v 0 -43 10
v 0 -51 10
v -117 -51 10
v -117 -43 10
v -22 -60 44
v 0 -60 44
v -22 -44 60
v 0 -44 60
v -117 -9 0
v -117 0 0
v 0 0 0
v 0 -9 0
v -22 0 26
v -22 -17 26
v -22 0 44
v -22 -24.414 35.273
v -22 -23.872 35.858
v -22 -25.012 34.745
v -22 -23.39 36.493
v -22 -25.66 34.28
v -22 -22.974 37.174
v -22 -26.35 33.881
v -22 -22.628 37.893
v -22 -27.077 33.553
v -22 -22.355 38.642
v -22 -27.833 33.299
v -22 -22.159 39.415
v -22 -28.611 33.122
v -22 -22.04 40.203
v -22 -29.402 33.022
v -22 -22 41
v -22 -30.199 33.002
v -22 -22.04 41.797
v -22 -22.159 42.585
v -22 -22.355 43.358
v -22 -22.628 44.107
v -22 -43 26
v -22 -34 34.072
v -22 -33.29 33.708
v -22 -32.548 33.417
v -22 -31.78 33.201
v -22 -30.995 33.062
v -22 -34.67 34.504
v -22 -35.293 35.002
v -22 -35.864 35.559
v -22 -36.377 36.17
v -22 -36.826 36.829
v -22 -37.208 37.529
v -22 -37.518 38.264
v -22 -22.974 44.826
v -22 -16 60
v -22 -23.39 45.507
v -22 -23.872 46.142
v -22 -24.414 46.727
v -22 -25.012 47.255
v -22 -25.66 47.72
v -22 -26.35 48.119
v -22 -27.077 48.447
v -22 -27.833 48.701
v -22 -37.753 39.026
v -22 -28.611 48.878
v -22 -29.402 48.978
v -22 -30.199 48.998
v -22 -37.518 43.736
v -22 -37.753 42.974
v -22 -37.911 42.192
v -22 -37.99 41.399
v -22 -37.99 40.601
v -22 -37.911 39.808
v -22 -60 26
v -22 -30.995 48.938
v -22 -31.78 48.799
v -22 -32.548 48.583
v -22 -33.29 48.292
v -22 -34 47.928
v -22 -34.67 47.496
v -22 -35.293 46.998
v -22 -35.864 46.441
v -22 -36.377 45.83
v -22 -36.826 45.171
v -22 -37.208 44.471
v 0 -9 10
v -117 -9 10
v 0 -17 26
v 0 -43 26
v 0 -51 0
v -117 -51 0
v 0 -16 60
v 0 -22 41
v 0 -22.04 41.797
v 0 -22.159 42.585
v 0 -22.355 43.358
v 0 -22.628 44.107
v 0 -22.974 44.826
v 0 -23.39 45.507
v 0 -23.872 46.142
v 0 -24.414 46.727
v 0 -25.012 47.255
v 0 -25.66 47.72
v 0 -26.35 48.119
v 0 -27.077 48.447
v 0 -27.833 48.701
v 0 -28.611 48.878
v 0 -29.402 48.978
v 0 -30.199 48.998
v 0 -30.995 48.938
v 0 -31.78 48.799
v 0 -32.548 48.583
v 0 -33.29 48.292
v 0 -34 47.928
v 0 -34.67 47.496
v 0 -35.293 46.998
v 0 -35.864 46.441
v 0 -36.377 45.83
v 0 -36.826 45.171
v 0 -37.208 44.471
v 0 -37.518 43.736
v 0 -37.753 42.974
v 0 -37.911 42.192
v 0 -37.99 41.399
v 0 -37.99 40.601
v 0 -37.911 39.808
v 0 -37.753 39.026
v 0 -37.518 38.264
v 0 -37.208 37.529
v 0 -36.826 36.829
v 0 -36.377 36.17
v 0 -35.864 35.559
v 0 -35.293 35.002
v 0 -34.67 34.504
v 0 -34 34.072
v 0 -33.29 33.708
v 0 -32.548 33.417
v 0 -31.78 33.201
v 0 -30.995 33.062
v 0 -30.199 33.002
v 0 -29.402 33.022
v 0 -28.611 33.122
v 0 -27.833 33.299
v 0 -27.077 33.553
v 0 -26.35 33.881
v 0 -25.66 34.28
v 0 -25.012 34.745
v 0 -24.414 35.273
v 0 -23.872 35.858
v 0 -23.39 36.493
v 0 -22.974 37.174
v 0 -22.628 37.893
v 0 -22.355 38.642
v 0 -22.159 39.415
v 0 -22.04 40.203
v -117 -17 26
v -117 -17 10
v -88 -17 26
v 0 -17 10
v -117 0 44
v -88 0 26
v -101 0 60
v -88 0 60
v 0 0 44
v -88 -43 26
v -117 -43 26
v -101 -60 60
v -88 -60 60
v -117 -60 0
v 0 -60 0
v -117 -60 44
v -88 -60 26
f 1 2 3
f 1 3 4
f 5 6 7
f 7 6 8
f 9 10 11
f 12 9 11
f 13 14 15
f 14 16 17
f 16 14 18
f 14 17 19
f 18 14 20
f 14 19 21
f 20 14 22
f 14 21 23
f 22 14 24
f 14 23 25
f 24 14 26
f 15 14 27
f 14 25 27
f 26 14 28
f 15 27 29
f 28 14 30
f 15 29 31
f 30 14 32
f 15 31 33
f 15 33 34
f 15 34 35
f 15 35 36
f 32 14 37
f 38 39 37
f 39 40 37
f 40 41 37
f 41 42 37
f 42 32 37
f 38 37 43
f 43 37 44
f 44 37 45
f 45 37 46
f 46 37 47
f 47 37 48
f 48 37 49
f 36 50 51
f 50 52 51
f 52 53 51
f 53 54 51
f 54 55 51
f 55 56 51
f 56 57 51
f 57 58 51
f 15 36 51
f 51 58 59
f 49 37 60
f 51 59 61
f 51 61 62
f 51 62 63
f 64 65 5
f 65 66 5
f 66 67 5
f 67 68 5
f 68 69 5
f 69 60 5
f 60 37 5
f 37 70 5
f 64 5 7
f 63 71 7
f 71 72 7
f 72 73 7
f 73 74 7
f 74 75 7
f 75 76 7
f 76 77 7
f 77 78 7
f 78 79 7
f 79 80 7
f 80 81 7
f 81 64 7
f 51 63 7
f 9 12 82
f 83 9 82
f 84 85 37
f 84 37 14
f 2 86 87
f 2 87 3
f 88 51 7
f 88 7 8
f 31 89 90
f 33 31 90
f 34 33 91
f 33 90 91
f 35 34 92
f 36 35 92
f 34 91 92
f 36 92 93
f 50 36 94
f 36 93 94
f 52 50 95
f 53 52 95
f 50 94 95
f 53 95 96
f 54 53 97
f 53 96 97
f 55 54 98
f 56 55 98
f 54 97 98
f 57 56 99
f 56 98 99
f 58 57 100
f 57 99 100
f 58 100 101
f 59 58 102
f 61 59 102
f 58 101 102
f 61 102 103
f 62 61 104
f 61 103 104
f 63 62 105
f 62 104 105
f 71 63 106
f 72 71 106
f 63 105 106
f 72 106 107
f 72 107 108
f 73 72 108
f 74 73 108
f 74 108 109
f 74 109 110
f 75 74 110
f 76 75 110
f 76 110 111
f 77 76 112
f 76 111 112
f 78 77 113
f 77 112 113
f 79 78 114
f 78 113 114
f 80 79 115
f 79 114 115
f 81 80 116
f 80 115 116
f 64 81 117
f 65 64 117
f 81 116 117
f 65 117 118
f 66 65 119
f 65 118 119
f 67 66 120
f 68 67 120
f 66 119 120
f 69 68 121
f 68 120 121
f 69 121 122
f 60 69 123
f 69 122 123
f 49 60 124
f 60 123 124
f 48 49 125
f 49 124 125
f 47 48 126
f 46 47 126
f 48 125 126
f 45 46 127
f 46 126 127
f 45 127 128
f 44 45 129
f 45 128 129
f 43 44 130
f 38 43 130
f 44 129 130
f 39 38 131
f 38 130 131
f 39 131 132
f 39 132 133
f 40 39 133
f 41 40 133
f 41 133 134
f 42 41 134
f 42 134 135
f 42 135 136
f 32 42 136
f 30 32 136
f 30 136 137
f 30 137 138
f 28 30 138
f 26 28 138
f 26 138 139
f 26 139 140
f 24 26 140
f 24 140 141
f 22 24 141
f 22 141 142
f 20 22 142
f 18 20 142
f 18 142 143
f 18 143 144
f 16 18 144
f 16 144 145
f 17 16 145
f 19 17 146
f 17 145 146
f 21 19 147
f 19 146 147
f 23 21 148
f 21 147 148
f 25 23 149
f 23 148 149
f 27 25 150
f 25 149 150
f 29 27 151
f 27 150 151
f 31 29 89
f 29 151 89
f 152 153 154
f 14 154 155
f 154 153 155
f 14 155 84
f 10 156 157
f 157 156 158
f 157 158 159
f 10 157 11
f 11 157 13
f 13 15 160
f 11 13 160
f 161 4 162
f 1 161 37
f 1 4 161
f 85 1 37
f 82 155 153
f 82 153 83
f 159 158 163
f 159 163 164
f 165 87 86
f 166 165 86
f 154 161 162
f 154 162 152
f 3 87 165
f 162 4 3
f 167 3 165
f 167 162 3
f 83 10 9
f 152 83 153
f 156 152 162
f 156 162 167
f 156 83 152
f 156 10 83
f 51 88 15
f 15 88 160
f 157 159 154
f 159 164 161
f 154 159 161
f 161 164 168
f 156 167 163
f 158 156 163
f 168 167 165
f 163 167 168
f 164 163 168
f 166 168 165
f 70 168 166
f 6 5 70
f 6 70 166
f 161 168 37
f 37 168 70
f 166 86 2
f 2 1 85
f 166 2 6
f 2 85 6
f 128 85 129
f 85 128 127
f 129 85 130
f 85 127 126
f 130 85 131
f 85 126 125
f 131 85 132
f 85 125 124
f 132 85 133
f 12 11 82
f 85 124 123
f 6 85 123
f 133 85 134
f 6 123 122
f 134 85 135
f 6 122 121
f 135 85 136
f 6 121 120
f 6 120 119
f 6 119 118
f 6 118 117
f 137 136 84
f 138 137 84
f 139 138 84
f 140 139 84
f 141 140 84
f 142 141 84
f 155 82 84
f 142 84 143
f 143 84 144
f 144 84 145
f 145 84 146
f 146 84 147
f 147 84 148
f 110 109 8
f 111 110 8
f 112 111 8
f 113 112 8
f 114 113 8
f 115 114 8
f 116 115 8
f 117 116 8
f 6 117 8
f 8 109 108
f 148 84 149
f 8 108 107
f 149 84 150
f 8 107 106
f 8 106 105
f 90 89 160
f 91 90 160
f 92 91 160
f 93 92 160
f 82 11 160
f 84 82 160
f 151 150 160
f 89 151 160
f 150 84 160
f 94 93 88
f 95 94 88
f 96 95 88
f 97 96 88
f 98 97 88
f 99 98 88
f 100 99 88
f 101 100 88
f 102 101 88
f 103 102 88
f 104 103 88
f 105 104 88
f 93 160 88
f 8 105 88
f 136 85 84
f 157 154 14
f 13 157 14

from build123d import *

# Parameters (mm, degrees)
F0_W      = 117
F0_H      = 60
F1_DEPTH  = 60
F2_W      = 42
F2_H      = 10
F3_DEPTH  = 117
F4_W      = 26
F4_H      = 16
F5_DEPTH  = 117
F7_DEPTH  = 22
F9_DEPTH  = 22
F11_DEPTH = 22
F13_DEPTH = 60
F15_DEPTH = 60


with BuildPart() as f1:
    # F0 (on Front) → F1 (new body)
    with BuildSketch(Plane.XZ):
        with Locations((-58.5, 30)):
            Rectangle(F0_W, F0_H)
    extrude(amount=F1_DEPTH)

    # F2 (on face) → F3 (cut)
    with BuildSketch(Plane.YZ):
        with Locations((-30, 5)):
            Rectangle(F2_W, F2_H)
    extrude(amount=-F3_DEPTH, mode=Mode.SUBTRACT)

    # F4 (on face) → F5 (cut)
    with BuildSketch(Plane.YZ):
        with Locations((-30, 18)):
            Rectangle(F4_W, F4_H)
    extrude(amount=-F5_DEPTH, mode=Mode.SUBTRACT)

    # F6 (on face) → F7 (cut)
    with BuildSketch(Plane.YZ):
        with BuildLine():
            ThreePointArc((-38, 41), (-30, 33), (-22, 41))
            ThreePointArc((-22, 41), (-30, 49), (-38, 41))
        make_face()
    extrude(amount=-F7_DEPTH, mode=Mode.SUBTRACT)

    # F8 (on face) → F9 (cut)
    with BuildSketch(Plane.YZ):
        Polygon((-44, 60), (-60, 60), (-60, 44), align=None)
    extrude(amount=-F9_DEPTH, mode=Mode.SUBTRACT)

    # F10 (on face) → F11 (cut)
    with BuildSketch(Plane.YZ):
        Polygon((0, 44), (0, 60), (-16, 60), align=None)
    extrude(amount=-F11_DEPTH, mode=Mode.SUBTRACT)

    # F12 (on face) → F13 (cut)
    with BuildSketch(Plane.XZ.offset(60)):
        Polygon((-22, 60), (-88, 60), (-88, 26), (-22, 26), (-22, 44), align=None)
    extrude(amount=-F13_DEPTH, mode=Mode.SUBTRACT)

    # F14 (on face) → F15 (cut)
    with BuildSketch(Plane.XZ.offset(60)):
        Polygon((-101, 60), (-117, 60), (-117, 44), align=None)
    extrude(amount=-F15_DEPTH, mode=Mode.SUBTRACT)


solid = f1.part
